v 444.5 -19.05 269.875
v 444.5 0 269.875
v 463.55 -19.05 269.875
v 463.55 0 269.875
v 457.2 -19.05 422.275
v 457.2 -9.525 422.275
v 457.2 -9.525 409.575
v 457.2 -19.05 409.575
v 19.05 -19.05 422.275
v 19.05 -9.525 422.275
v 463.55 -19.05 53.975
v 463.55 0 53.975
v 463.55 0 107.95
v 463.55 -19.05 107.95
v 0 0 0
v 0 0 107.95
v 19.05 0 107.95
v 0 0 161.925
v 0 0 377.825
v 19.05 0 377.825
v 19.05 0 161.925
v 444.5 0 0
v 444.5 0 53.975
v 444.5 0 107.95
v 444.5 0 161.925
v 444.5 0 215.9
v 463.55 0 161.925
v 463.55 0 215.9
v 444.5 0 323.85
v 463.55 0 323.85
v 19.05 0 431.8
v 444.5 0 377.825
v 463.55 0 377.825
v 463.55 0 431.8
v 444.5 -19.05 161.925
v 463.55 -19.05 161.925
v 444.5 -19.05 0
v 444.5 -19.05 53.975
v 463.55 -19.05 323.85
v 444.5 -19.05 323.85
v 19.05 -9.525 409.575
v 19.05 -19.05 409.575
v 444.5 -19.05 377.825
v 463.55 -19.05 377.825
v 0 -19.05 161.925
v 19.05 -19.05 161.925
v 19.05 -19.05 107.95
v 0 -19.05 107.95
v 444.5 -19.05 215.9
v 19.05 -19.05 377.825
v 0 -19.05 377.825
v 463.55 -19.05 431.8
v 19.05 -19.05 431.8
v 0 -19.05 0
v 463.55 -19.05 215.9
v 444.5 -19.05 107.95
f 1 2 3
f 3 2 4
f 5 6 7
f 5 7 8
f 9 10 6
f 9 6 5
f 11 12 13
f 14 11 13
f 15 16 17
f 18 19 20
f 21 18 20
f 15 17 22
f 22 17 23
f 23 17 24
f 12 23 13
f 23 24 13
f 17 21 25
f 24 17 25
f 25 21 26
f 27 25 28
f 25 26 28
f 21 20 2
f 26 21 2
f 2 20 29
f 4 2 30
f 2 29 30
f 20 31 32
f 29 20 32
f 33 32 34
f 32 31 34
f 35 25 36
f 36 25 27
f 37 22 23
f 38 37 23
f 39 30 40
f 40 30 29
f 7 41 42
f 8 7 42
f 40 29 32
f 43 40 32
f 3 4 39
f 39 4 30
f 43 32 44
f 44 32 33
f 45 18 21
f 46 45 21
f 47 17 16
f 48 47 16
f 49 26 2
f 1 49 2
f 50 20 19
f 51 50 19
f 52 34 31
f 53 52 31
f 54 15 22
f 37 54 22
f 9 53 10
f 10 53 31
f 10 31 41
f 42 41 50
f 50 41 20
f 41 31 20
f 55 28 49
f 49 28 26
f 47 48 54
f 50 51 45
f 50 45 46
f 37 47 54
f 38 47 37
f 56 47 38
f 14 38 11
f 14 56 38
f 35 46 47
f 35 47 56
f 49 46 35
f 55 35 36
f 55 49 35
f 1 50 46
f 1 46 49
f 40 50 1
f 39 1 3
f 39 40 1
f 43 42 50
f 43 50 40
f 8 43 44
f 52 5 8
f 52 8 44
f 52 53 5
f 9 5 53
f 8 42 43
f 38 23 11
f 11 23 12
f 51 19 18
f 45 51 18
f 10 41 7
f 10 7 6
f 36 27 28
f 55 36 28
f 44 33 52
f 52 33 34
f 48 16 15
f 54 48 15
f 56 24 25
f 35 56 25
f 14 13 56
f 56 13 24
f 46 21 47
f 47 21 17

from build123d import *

# Parameters (mm, degrees)
F1_DEPTH = 19.05
F2_W     = 9.525
F2_H     = 12.7
F3_DEPTH = 438.15


with BuildPart() as f1:
    # F0 (on Front) → F1 (new body)
    with BuildSketch(Plane.XZ):
        Polygon((0, 107.95), (0, 0), (444.5, 0), (444.5, 53.975), (463.55, 53.975), (463.55, 107.95), (444.5, 107.95), (444.5, 161.925), (463.55, 161.925), (463.55, 215.9), (444.5, 215.9), (444.5, 269.875), (463.55, 269.875), (463.55, 323.85), (444.5, 323.85), (444.5, 377.825), (463.55, 377.825), (463.55, 431.8), (19.05, 431.8), (19.05, 377.825), (0, 377.825), (0, 161.925), (19.05, 161.925), (19.05, 107.95), align=None)
    extrude(amount=F1_DEPTH)

    # F2 (on face) → F3 (cut)
    with BuildSketch(Plane(origin=(19.05, 0, 0), x_dir=(0, -1, 0), z_dir=(-1, 0, 0))):
        with Locations((14.2875, 415.925)):
            Rectangle(F2_W, F2_H)
    extrude(amount=-F3_DEPTH, mode=Mode.SUBTRACT)


solid = f1.part
